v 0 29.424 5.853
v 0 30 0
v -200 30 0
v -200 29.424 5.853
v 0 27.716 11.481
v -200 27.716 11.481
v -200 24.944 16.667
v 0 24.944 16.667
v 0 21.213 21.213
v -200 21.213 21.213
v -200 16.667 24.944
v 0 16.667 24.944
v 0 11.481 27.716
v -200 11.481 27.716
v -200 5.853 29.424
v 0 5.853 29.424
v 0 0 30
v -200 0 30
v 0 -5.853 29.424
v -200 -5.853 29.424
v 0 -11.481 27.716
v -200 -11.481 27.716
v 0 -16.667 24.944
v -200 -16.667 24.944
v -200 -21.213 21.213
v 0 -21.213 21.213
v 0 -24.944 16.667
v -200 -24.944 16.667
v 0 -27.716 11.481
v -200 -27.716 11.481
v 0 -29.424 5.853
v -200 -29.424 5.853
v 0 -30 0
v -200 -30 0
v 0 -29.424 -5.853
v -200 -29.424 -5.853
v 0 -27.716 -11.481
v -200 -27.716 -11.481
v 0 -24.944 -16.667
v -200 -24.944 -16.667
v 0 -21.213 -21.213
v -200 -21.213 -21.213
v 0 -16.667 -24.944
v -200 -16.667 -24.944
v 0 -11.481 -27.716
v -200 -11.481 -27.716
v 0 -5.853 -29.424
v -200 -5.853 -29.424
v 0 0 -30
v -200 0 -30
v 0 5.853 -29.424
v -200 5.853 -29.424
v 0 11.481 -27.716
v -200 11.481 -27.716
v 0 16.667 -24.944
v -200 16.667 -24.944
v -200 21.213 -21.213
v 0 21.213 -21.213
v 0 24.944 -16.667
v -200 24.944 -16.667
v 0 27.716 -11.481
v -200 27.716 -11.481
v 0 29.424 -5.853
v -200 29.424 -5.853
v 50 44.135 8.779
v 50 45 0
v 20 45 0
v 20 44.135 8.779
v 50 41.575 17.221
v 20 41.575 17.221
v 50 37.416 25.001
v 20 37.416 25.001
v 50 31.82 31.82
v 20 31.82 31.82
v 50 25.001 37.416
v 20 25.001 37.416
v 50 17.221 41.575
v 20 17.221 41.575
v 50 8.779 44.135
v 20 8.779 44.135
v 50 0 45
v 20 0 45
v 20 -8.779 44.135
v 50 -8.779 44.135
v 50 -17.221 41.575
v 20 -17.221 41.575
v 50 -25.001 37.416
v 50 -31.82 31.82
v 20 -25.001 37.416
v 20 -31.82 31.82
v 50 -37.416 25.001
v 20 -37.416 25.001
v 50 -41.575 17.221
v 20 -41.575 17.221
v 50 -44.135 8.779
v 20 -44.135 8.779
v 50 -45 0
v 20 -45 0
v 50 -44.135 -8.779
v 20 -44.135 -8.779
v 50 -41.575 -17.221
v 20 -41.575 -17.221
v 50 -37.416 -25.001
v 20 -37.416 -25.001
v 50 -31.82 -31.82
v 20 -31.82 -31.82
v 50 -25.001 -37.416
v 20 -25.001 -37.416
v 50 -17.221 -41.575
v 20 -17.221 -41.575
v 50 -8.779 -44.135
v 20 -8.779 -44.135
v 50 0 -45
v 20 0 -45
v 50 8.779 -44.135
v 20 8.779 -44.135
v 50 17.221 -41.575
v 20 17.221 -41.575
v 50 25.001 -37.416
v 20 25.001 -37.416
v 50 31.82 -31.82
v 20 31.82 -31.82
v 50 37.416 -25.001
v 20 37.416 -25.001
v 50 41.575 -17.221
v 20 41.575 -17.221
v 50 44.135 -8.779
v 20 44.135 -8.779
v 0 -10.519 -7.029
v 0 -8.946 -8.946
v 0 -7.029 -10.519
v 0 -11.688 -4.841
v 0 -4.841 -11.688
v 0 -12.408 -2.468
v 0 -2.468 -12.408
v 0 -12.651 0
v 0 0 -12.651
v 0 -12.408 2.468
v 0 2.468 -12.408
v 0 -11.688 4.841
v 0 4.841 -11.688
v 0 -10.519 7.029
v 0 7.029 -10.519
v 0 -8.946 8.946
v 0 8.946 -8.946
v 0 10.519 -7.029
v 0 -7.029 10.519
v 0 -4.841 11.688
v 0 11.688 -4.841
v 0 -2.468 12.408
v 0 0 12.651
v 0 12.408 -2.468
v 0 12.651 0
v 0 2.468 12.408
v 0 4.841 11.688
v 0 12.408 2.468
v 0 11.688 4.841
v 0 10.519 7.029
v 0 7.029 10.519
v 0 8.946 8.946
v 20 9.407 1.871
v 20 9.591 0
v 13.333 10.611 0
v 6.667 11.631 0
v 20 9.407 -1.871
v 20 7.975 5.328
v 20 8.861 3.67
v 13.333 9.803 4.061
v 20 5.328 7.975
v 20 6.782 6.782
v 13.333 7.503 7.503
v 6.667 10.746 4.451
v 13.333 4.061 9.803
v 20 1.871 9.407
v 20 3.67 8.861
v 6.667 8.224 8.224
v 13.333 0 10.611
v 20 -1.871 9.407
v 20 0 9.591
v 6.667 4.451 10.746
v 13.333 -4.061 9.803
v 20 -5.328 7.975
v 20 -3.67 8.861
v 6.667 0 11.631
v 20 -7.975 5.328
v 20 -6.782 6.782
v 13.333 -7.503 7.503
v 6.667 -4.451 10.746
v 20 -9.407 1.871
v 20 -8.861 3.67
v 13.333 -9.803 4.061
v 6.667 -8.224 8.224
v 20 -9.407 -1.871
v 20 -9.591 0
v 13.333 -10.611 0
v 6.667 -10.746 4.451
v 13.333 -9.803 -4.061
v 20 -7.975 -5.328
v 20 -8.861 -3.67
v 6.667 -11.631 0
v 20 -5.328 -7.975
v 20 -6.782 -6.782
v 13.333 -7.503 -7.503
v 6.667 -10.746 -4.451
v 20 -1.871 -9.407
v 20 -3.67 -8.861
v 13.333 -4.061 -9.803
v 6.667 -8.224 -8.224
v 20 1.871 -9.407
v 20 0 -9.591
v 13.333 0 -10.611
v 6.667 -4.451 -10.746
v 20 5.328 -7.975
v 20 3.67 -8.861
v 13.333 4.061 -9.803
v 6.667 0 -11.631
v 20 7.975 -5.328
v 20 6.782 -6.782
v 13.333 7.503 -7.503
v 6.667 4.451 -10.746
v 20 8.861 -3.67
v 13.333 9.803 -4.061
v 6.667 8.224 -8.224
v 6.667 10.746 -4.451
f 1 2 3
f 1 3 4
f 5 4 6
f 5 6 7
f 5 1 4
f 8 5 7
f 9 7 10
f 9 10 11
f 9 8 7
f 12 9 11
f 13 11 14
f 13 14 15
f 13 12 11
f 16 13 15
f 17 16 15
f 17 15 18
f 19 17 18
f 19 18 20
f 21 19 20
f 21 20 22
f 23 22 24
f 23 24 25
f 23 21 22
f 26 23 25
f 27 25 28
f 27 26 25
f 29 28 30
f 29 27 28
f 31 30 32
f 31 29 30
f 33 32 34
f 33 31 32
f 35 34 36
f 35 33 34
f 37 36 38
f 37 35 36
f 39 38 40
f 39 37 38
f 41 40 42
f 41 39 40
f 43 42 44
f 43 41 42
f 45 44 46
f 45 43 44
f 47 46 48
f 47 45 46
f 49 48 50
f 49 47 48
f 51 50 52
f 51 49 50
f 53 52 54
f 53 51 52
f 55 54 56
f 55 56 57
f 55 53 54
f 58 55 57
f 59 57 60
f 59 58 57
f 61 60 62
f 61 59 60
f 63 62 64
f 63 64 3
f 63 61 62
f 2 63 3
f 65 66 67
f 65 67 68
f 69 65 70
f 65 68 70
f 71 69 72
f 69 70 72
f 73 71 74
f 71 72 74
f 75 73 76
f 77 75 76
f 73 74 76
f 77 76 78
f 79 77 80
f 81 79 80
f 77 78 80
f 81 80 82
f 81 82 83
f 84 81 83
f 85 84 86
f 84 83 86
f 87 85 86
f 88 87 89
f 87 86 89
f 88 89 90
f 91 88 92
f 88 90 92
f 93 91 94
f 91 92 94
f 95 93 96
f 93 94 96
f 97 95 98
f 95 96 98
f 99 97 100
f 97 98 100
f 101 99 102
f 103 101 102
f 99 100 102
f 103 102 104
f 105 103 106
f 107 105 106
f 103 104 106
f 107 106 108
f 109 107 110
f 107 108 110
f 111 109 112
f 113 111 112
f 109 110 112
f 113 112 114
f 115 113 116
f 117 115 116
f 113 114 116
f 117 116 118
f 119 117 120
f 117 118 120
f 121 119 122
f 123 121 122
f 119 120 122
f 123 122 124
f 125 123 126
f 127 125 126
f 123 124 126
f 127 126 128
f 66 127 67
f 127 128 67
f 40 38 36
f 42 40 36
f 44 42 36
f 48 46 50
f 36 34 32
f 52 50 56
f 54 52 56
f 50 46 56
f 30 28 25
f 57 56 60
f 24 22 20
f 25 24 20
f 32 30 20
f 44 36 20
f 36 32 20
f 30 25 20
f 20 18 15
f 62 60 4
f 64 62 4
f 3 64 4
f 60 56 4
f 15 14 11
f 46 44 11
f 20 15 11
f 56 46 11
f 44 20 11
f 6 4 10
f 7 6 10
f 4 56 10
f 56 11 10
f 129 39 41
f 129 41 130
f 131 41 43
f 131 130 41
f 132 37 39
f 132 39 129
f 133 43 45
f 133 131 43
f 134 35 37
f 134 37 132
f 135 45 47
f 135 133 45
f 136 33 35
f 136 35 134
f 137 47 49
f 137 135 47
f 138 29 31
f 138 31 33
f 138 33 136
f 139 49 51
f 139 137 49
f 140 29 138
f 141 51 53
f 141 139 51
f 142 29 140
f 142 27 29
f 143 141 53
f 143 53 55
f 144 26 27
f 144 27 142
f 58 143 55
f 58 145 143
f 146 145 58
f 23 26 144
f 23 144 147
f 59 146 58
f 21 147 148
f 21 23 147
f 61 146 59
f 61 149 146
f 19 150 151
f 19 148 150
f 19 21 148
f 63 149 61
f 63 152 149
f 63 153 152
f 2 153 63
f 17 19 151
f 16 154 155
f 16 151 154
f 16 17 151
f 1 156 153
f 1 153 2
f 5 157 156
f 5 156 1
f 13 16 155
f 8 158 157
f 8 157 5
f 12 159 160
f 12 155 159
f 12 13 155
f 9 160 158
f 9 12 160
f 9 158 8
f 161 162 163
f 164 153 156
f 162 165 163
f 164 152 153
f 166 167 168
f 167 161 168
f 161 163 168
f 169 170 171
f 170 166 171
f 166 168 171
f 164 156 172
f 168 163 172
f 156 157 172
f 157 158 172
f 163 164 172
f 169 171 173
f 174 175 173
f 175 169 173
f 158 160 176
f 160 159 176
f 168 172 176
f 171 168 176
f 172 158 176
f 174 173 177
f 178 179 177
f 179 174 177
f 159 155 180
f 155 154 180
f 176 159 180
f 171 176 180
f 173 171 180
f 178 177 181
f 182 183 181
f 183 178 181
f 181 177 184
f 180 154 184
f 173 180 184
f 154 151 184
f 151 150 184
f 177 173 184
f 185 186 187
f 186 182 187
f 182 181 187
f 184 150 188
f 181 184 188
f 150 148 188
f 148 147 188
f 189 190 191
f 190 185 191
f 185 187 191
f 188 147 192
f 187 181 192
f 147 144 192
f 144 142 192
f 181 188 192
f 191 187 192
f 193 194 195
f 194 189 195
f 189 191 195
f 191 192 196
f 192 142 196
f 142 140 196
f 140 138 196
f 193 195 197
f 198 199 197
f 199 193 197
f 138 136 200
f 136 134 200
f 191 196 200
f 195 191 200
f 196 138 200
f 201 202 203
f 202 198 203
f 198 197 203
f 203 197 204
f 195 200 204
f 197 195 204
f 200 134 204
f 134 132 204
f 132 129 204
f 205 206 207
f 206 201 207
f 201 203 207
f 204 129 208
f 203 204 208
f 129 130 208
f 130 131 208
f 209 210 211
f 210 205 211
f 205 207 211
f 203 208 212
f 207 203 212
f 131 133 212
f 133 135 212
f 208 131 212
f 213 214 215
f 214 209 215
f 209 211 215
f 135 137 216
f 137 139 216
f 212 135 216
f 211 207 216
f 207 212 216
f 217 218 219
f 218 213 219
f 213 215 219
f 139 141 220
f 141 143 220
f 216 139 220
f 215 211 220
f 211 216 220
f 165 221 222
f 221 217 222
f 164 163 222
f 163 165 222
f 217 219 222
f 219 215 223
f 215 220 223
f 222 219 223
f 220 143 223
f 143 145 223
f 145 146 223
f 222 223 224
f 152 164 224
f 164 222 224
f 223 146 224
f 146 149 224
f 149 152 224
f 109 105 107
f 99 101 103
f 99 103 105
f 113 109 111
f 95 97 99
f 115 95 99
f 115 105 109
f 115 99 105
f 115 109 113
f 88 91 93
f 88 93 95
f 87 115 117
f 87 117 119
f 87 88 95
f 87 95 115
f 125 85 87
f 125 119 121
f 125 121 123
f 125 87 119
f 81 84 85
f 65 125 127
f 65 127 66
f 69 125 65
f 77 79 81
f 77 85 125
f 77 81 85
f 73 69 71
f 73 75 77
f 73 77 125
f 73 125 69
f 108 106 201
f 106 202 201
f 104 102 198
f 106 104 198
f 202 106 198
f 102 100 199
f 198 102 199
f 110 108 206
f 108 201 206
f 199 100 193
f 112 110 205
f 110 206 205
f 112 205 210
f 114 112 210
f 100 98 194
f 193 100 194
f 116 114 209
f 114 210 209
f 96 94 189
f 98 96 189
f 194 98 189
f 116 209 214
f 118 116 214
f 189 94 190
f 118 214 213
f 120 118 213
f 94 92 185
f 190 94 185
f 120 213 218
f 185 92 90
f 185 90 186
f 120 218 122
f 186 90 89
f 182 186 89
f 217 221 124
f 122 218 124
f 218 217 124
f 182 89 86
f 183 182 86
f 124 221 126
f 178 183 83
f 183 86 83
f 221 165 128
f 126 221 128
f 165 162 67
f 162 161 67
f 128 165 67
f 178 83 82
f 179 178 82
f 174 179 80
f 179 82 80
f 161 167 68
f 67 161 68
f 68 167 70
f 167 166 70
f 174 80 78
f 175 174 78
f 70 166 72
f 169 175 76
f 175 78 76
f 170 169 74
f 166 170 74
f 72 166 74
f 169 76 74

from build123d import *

# Parameters (mm, degrees)
F0_R     = 30
F1_DEPTH = 200
F5_START = 20
F4_R     = 45
F5_DEPTH = 30


with BuildPart() as f1:
    # F0 (on Right) → F1 (new body)
    with BuildSketch(Plane.YZ):
        Circle(F0_R)
    extrude(amount=-F1_DEPTH)

    # F2 (on Top) → F3 (revolve)
    with BuildSketch(Plane.XY):
        Polygon((0, 12.6511614473), (0, 0), (30.3976608496, 0), (30.3976608496, 8), align=None)
    revolve(axis=Axis((15.1988304248, 0, 0), (1, 0, 0)))

    # F4 (on Right) → F5 (join)
    with BuildSketch(Plane.YZ.offset(F5_START)):
        Circle(F4_R)
    extrude(amount=F5_DEPTH)


solid = f1.part
